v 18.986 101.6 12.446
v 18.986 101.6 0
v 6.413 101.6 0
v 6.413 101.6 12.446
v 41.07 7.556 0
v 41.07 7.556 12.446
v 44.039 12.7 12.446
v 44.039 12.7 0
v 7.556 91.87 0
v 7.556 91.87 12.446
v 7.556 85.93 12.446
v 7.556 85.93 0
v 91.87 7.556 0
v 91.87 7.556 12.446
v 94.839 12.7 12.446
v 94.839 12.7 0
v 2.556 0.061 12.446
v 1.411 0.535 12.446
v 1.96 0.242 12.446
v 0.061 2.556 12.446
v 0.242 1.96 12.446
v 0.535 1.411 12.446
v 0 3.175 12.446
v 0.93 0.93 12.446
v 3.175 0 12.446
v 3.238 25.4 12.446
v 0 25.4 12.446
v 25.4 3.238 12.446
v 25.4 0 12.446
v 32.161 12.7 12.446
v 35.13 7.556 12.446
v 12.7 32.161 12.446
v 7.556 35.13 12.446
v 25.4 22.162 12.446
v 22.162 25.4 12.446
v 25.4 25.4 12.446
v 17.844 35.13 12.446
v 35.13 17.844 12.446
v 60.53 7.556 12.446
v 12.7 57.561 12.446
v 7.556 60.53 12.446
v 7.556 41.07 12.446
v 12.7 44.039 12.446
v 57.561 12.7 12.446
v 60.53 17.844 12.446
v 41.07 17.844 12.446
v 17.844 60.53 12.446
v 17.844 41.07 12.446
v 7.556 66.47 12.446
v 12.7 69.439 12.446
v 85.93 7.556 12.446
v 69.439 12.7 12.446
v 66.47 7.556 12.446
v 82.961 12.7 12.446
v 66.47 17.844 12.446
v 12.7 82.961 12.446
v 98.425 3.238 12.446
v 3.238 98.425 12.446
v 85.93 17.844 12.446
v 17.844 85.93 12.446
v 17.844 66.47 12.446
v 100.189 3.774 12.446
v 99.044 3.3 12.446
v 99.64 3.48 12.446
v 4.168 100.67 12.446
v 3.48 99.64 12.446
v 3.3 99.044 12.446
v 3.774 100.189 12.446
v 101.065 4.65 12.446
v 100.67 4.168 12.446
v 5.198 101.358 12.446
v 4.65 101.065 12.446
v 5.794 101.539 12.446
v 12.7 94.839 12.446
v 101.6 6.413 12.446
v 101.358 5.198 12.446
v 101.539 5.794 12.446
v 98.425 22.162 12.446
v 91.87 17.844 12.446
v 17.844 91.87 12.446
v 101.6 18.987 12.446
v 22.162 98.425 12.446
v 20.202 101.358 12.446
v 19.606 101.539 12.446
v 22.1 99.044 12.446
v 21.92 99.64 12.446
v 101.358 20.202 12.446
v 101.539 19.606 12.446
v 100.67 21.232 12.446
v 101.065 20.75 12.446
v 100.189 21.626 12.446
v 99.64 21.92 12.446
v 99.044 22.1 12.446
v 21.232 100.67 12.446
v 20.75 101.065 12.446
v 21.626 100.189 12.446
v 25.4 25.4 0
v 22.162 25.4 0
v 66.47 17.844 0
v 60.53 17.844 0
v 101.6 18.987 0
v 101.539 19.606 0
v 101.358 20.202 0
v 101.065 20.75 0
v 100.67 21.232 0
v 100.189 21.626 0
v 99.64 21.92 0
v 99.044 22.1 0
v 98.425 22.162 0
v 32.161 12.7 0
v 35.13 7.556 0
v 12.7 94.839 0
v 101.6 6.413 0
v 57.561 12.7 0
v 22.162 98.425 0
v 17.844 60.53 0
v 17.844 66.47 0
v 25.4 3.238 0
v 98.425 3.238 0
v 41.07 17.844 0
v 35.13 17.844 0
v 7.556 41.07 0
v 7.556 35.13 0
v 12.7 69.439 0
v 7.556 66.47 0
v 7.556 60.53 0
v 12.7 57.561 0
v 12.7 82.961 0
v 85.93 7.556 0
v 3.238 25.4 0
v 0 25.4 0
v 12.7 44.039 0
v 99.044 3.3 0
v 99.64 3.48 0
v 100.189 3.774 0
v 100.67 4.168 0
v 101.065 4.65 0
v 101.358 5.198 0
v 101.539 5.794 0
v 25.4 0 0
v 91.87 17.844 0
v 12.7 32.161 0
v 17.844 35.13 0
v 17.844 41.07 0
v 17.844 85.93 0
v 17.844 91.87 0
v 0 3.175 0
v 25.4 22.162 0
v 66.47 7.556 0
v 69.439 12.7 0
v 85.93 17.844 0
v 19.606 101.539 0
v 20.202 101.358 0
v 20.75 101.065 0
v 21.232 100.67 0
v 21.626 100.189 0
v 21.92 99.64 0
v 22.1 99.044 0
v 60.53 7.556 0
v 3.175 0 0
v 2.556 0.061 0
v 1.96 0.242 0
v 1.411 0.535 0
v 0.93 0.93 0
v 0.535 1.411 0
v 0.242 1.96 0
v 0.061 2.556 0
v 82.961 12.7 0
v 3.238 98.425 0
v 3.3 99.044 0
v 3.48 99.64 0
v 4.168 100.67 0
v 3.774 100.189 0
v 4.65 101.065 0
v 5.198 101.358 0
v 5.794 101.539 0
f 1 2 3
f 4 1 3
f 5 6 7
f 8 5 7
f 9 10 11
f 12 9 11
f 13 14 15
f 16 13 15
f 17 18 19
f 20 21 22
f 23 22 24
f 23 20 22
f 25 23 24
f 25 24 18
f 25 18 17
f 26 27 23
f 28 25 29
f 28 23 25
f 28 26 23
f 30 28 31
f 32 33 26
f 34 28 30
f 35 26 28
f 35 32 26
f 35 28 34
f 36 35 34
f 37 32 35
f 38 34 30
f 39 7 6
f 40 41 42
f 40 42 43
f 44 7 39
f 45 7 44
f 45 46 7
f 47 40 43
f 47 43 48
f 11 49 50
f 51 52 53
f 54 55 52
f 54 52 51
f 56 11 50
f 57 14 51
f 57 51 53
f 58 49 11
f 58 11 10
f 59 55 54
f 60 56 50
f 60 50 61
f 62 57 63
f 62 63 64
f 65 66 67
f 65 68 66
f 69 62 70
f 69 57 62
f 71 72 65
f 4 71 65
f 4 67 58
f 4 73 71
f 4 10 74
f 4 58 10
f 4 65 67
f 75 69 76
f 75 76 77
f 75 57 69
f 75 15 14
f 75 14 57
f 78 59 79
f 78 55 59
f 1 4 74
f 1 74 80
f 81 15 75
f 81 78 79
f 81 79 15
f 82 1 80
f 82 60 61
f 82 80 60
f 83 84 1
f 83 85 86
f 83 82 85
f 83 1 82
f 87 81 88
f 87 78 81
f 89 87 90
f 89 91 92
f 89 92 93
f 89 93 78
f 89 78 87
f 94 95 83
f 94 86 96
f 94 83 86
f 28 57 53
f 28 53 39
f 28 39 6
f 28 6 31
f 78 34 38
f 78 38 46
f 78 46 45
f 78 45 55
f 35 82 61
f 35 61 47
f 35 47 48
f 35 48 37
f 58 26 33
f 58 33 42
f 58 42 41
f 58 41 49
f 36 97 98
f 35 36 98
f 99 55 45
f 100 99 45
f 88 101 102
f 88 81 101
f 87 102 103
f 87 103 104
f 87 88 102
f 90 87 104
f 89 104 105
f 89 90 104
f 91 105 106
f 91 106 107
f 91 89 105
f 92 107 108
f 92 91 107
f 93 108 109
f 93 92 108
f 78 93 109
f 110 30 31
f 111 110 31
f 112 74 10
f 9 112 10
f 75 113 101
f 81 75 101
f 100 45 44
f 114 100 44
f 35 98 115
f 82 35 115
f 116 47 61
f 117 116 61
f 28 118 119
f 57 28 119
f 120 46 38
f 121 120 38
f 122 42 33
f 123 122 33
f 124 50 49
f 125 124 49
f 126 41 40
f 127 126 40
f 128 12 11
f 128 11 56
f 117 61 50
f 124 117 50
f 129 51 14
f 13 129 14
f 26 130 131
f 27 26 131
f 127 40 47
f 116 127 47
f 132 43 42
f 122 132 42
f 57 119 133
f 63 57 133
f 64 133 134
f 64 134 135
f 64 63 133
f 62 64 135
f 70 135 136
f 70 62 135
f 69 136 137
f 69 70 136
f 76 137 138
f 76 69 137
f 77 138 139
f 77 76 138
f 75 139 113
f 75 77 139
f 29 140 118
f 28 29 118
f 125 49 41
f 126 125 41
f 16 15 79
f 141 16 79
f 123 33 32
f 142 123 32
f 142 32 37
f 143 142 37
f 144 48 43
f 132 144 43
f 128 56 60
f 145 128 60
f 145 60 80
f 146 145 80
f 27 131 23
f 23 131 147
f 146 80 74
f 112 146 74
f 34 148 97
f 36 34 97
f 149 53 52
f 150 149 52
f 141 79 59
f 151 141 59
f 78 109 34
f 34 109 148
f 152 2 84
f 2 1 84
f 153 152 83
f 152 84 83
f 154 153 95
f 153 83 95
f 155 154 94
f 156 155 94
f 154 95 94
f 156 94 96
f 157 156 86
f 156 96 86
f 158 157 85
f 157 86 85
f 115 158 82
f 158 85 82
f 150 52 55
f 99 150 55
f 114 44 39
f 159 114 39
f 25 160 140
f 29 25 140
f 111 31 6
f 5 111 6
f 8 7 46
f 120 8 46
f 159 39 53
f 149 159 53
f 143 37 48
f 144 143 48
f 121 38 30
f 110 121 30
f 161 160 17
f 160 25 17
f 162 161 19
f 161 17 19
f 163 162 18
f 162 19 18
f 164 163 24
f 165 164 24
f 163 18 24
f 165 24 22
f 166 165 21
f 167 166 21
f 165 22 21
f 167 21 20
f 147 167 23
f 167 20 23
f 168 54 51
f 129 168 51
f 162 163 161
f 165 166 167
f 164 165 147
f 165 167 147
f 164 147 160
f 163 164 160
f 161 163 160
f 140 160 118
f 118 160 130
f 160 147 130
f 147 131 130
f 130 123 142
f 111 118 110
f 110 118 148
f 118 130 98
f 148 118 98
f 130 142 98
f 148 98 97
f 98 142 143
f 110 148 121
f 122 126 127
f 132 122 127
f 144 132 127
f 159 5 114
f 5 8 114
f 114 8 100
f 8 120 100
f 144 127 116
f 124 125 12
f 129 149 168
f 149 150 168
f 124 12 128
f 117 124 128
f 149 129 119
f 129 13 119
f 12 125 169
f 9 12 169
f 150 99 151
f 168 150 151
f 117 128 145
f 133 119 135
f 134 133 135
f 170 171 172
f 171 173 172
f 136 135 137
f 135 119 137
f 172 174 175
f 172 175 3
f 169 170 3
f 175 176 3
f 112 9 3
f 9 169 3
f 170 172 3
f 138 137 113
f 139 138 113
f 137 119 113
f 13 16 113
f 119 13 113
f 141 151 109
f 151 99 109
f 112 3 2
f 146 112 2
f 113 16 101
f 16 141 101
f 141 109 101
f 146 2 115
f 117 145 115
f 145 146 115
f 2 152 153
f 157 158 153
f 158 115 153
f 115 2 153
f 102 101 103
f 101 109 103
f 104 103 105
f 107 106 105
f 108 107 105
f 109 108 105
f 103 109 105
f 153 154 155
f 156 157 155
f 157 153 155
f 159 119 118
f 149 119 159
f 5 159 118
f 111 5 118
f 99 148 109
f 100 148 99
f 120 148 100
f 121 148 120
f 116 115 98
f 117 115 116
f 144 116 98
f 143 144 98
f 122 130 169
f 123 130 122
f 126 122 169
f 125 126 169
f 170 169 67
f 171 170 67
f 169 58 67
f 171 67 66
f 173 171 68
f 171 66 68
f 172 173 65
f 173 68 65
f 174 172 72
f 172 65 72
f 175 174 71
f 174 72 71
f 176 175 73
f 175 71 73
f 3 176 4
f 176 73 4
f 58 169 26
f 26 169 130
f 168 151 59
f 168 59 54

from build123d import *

# Parameters (mm, degrees)
BOSS_EXTRUDE1_DEPTH = 12.446
CUT_EXTRUDE1_DEPTH  = 145.222130465
FILLET1_R           = 3.175


with BuildPart() as part:
    # Sketch1 → Boss-Extrude1 (new body)
    with BuildSketch(Plane.XY):
        Polygon((0, 0), (25.4, 0), (25.4, 3.2385), (101.6, 3.2385), (101.6, 22.1615), (25.4, 22.1615), (25.4, 25.4), (22.1615, 25.4), (22.1615, 101.6), (3.2385, 101.6), (3.2385, 25.4), (0, 25.4), align=None)
    extrude(amount=BOSS_EXTRUDE1_DEPTH)

    # Sketch2 → Cut-Extrude1 (cut, through all)
    with BuildSketch(Plane.XY.offset(12.446)):
        Polygon((17.8435, 85.93039889), (17.8435, 91.86960111), (12.7, 94.839202219), (7.5565, 91.86960111), (7.5565, 85.93039889), (12.7, 82.960797781), align=None)
        Polygon((17.8435, 60.53039889), (17.8435, 66.46960111), (12.7, 69.439202219), (7.5565, 66.46960111), (7.5565, 60.53039889), (12.7, 57.560797781), align=None)
        Polygon((17.8435, 35.13039889), (17.8435, 41.06960111), (12.7, 44.039202219), (7.5565, 41.06960111), (7.5565, 35.13039889), (12.7, 32.160797781), align=None)
        Polygon((41.06960111, 7.5565), (44.039202219, 12.7), (41.06960111, 17.8435), (35.13039889, 17.8435), (32.160797781, 12.7), (35.13039889, 7.5565), align=None)
        Polygon((66.46960111, 7.5565), (69.439202219, 12.7), (66.46960111, 17.8435), (60.53039889, 17.8435), (57.560797781, 12.7), (60.53039889, 7.5565), align=None)
        Polygon((91.86960111, 7.5565), (94.839202219, 12.7), (91.86960111, 17.8435), (85.93039889, 17.8435), (82.960797781, 12.7), (85.93039889, 7.5565), align=None)
    extrude(amount=-CUT_EXTRUDE1_DEPTH, mode=Mode.SUBTRACT)

    # Fillet1
    fillet1_edges = [part.edges().sort_by_distance(p)[0] for p in [
        (3.2385, 101.6, 6.223),
        (22.1615, 101.6, 6.223),
        (101.6, 22.1615, 6.223),
        (101.6, 3.2385, 6.223),
        (0, 0, 6.223),
    ]]
    fillet(fillet1_edges, radius=FILLET1_R)


solid = part.part
